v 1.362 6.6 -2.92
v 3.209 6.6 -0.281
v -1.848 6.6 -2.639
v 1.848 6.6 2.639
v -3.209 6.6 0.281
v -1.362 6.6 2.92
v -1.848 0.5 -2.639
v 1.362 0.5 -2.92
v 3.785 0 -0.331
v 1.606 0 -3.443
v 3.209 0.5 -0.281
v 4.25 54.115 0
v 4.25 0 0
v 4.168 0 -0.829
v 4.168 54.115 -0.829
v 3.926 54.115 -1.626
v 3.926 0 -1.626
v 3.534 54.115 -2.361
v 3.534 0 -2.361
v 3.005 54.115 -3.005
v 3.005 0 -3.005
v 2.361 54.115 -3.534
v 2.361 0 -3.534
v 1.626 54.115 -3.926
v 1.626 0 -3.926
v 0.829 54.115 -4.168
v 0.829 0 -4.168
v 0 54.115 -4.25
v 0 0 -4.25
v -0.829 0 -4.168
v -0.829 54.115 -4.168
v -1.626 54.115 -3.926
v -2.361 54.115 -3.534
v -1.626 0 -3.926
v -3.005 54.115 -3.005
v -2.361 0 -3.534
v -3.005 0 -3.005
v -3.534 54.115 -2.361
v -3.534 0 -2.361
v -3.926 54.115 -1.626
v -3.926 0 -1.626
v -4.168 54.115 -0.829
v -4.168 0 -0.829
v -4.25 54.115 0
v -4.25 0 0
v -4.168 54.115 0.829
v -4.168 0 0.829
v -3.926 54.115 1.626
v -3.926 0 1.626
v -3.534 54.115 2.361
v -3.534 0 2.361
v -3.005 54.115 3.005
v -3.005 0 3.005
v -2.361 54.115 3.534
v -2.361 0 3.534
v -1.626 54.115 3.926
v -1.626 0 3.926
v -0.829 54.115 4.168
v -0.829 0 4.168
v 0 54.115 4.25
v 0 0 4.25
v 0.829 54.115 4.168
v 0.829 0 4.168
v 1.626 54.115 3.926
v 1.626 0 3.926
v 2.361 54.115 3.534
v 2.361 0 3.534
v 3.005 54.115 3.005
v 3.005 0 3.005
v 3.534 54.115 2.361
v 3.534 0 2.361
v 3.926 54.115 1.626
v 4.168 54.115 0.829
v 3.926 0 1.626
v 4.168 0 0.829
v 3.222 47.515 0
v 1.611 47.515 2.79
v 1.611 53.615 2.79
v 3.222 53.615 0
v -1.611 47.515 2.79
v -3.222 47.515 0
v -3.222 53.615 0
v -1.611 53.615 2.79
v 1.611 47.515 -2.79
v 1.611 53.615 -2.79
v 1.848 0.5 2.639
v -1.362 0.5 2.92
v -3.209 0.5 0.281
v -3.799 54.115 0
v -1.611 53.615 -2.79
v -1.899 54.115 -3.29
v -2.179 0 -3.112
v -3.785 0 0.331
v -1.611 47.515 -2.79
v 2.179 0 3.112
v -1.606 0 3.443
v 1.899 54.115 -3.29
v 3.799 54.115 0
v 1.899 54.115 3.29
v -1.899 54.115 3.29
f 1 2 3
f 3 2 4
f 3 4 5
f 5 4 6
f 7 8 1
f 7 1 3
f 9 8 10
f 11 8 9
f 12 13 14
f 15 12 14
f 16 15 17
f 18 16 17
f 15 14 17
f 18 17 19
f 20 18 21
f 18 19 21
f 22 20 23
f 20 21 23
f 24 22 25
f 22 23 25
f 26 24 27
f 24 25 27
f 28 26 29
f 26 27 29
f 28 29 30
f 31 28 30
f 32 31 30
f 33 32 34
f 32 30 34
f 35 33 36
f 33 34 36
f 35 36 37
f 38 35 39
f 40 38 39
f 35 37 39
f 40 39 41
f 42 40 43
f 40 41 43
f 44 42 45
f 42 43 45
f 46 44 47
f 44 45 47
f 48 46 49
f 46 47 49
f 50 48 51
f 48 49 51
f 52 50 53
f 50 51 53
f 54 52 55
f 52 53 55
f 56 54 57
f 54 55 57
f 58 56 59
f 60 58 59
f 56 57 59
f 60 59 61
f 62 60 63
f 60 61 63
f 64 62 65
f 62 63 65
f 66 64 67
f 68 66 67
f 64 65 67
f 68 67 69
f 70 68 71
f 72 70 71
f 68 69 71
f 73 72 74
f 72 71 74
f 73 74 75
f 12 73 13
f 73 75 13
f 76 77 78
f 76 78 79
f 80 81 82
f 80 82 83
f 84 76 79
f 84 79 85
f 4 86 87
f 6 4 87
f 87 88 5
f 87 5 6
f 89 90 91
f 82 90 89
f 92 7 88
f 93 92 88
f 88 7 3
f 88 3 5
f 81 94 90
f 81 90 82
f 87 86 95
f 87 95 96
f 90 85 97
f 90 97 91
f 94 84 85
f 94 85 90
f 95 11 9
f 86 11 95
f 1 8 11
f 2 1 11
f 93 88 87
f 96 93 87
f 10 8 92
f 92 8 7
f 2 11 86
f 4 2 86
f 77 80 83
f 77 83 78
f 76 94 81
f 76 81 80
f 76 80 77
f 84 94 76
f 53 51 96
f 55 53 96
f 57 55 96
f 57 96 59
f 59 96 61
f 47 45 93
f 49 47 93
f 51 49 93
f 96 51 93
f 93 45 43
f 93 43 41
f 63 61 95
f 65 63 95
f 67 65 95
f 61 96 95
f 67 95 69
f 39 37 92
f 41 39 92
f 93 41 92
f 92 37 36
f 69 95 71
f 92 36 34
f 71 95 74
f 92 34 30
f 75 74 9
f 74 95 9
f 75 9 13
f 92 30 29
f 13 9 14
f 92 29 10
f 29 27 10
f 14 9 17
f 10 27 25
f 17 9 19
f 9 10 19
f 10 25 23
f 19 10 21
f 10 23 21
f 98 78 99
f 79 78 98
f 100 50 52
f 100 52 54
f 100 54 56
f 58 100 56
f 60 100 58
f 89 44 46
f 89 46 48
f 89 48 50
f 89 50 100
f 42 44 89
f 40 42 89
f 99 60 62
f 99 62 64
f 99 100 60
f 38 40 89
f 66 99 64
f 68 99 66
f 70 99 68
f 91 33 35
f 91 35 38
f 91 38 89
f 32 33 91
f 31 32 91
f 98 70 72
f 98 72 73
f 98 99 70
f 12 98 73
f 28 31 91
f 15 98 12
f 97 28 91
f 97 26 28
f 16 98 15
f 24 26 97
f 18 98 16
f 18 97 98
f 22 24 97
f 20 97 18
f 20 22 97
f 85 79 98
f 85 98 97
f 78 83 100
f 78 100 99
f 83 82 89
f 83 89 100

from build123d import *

# Parameters (mm, degrees)
SKETCH1_R           = 4.25
BOSS_EXTRUDE1_DEPTH = 54.11518367
CUT_EXTRUDE1_DEPTH  = 6.6
CHAMFER1_SIZE       = 0.5
CUT_EXTRUDE2_DEPTH  = 6.6
CHAMFER2_SIZE       = 0.5


with BuildPart() as part:
    # Sketch1 → Boss-Extrude1 (new body)
    with BuildSketch(Plane(origin=(0, 0, 0), x_dir=(1, 0, 0), z_dir=(0, 1, 0))):
        Circle(SKETCH1_R)
    extrude(amount=BOSS_EXTRUDE1_DEPTH)

    # Sketch2 → Cut-Extrude1 (cut)
    with BuildSketch(Plane(origin=(0, 54.11518367, 0), x_dir=(1, 0, 0), z_dir=(0, 1, 0))):
        Polygon((0, -2.79), (0, 2.79), (-1.610807251, 2.79), (-3.221614502, 0), (-1.610807251, -2.79), align=None)
        Polygon((1.610807251, 2.79), (0, 2.79), (0, -2.79), (1.610807251, -2.79), (3.221614502, 0), align=None)
    extrude(amount=-CUT_EXTRUDE1_DEPTH, mode=Mode.SUBTRACT)

    # Chamfer1
    chamfer1_edges = [part.edges().sort_by_distance(p)[0] for p in [
        (-2.416210877, 54.11518367, 1.395),
        (0, 54.11518367, 2.79),
        (2.416210877, 54.11518367, 1.395),
        (2.416210877, 54.11518367, -1.395),
        (0, 54.11518367, -2.79),
        (-2.416210877, 54.11518367, -1.395),
    ]]
    chamfer(chamfer1_edges, length=CHAMFER1_SIZE)

    # Sketch3 → Cut-Extrude2 (cut)
    with BuildSketch(Plane.XZ):
        Polygon((-1.361513121, 2.91977431), (1.361513121, -2.91977431), (-1.847842165, -2.638992105), (-3.209355286, 0.280782205), align=None)
        Polygon((1.847842165, 2.638992105), (-1.361513121, 2.91977431), (1.361513121, -2.91977431), (3.209355286, -0.280782205), align=None)
    extrude(amount=-CUT_EXTRUDE2_DEPTH, mode=Mode.SUBTRACT)

    # Chamfer2
    chamfer2_edges = [part.edges().sort_by_distance(p)[0] for p in [
        (-0.243164522, 0, -2.779383208),
        (2.285434204, 0, -1.600278257),
        (2.528598726, 0, 1.17910495),
        (0.243164522, 0, 2.779383208),
        (-2.285434204, 0, 1.600278257),
        (-2.528598726, 0, -1.17910495),
    ]]
    chamfer(chamfer2_edges, length=CHAMFER2_SIZE)


solid = part.part
